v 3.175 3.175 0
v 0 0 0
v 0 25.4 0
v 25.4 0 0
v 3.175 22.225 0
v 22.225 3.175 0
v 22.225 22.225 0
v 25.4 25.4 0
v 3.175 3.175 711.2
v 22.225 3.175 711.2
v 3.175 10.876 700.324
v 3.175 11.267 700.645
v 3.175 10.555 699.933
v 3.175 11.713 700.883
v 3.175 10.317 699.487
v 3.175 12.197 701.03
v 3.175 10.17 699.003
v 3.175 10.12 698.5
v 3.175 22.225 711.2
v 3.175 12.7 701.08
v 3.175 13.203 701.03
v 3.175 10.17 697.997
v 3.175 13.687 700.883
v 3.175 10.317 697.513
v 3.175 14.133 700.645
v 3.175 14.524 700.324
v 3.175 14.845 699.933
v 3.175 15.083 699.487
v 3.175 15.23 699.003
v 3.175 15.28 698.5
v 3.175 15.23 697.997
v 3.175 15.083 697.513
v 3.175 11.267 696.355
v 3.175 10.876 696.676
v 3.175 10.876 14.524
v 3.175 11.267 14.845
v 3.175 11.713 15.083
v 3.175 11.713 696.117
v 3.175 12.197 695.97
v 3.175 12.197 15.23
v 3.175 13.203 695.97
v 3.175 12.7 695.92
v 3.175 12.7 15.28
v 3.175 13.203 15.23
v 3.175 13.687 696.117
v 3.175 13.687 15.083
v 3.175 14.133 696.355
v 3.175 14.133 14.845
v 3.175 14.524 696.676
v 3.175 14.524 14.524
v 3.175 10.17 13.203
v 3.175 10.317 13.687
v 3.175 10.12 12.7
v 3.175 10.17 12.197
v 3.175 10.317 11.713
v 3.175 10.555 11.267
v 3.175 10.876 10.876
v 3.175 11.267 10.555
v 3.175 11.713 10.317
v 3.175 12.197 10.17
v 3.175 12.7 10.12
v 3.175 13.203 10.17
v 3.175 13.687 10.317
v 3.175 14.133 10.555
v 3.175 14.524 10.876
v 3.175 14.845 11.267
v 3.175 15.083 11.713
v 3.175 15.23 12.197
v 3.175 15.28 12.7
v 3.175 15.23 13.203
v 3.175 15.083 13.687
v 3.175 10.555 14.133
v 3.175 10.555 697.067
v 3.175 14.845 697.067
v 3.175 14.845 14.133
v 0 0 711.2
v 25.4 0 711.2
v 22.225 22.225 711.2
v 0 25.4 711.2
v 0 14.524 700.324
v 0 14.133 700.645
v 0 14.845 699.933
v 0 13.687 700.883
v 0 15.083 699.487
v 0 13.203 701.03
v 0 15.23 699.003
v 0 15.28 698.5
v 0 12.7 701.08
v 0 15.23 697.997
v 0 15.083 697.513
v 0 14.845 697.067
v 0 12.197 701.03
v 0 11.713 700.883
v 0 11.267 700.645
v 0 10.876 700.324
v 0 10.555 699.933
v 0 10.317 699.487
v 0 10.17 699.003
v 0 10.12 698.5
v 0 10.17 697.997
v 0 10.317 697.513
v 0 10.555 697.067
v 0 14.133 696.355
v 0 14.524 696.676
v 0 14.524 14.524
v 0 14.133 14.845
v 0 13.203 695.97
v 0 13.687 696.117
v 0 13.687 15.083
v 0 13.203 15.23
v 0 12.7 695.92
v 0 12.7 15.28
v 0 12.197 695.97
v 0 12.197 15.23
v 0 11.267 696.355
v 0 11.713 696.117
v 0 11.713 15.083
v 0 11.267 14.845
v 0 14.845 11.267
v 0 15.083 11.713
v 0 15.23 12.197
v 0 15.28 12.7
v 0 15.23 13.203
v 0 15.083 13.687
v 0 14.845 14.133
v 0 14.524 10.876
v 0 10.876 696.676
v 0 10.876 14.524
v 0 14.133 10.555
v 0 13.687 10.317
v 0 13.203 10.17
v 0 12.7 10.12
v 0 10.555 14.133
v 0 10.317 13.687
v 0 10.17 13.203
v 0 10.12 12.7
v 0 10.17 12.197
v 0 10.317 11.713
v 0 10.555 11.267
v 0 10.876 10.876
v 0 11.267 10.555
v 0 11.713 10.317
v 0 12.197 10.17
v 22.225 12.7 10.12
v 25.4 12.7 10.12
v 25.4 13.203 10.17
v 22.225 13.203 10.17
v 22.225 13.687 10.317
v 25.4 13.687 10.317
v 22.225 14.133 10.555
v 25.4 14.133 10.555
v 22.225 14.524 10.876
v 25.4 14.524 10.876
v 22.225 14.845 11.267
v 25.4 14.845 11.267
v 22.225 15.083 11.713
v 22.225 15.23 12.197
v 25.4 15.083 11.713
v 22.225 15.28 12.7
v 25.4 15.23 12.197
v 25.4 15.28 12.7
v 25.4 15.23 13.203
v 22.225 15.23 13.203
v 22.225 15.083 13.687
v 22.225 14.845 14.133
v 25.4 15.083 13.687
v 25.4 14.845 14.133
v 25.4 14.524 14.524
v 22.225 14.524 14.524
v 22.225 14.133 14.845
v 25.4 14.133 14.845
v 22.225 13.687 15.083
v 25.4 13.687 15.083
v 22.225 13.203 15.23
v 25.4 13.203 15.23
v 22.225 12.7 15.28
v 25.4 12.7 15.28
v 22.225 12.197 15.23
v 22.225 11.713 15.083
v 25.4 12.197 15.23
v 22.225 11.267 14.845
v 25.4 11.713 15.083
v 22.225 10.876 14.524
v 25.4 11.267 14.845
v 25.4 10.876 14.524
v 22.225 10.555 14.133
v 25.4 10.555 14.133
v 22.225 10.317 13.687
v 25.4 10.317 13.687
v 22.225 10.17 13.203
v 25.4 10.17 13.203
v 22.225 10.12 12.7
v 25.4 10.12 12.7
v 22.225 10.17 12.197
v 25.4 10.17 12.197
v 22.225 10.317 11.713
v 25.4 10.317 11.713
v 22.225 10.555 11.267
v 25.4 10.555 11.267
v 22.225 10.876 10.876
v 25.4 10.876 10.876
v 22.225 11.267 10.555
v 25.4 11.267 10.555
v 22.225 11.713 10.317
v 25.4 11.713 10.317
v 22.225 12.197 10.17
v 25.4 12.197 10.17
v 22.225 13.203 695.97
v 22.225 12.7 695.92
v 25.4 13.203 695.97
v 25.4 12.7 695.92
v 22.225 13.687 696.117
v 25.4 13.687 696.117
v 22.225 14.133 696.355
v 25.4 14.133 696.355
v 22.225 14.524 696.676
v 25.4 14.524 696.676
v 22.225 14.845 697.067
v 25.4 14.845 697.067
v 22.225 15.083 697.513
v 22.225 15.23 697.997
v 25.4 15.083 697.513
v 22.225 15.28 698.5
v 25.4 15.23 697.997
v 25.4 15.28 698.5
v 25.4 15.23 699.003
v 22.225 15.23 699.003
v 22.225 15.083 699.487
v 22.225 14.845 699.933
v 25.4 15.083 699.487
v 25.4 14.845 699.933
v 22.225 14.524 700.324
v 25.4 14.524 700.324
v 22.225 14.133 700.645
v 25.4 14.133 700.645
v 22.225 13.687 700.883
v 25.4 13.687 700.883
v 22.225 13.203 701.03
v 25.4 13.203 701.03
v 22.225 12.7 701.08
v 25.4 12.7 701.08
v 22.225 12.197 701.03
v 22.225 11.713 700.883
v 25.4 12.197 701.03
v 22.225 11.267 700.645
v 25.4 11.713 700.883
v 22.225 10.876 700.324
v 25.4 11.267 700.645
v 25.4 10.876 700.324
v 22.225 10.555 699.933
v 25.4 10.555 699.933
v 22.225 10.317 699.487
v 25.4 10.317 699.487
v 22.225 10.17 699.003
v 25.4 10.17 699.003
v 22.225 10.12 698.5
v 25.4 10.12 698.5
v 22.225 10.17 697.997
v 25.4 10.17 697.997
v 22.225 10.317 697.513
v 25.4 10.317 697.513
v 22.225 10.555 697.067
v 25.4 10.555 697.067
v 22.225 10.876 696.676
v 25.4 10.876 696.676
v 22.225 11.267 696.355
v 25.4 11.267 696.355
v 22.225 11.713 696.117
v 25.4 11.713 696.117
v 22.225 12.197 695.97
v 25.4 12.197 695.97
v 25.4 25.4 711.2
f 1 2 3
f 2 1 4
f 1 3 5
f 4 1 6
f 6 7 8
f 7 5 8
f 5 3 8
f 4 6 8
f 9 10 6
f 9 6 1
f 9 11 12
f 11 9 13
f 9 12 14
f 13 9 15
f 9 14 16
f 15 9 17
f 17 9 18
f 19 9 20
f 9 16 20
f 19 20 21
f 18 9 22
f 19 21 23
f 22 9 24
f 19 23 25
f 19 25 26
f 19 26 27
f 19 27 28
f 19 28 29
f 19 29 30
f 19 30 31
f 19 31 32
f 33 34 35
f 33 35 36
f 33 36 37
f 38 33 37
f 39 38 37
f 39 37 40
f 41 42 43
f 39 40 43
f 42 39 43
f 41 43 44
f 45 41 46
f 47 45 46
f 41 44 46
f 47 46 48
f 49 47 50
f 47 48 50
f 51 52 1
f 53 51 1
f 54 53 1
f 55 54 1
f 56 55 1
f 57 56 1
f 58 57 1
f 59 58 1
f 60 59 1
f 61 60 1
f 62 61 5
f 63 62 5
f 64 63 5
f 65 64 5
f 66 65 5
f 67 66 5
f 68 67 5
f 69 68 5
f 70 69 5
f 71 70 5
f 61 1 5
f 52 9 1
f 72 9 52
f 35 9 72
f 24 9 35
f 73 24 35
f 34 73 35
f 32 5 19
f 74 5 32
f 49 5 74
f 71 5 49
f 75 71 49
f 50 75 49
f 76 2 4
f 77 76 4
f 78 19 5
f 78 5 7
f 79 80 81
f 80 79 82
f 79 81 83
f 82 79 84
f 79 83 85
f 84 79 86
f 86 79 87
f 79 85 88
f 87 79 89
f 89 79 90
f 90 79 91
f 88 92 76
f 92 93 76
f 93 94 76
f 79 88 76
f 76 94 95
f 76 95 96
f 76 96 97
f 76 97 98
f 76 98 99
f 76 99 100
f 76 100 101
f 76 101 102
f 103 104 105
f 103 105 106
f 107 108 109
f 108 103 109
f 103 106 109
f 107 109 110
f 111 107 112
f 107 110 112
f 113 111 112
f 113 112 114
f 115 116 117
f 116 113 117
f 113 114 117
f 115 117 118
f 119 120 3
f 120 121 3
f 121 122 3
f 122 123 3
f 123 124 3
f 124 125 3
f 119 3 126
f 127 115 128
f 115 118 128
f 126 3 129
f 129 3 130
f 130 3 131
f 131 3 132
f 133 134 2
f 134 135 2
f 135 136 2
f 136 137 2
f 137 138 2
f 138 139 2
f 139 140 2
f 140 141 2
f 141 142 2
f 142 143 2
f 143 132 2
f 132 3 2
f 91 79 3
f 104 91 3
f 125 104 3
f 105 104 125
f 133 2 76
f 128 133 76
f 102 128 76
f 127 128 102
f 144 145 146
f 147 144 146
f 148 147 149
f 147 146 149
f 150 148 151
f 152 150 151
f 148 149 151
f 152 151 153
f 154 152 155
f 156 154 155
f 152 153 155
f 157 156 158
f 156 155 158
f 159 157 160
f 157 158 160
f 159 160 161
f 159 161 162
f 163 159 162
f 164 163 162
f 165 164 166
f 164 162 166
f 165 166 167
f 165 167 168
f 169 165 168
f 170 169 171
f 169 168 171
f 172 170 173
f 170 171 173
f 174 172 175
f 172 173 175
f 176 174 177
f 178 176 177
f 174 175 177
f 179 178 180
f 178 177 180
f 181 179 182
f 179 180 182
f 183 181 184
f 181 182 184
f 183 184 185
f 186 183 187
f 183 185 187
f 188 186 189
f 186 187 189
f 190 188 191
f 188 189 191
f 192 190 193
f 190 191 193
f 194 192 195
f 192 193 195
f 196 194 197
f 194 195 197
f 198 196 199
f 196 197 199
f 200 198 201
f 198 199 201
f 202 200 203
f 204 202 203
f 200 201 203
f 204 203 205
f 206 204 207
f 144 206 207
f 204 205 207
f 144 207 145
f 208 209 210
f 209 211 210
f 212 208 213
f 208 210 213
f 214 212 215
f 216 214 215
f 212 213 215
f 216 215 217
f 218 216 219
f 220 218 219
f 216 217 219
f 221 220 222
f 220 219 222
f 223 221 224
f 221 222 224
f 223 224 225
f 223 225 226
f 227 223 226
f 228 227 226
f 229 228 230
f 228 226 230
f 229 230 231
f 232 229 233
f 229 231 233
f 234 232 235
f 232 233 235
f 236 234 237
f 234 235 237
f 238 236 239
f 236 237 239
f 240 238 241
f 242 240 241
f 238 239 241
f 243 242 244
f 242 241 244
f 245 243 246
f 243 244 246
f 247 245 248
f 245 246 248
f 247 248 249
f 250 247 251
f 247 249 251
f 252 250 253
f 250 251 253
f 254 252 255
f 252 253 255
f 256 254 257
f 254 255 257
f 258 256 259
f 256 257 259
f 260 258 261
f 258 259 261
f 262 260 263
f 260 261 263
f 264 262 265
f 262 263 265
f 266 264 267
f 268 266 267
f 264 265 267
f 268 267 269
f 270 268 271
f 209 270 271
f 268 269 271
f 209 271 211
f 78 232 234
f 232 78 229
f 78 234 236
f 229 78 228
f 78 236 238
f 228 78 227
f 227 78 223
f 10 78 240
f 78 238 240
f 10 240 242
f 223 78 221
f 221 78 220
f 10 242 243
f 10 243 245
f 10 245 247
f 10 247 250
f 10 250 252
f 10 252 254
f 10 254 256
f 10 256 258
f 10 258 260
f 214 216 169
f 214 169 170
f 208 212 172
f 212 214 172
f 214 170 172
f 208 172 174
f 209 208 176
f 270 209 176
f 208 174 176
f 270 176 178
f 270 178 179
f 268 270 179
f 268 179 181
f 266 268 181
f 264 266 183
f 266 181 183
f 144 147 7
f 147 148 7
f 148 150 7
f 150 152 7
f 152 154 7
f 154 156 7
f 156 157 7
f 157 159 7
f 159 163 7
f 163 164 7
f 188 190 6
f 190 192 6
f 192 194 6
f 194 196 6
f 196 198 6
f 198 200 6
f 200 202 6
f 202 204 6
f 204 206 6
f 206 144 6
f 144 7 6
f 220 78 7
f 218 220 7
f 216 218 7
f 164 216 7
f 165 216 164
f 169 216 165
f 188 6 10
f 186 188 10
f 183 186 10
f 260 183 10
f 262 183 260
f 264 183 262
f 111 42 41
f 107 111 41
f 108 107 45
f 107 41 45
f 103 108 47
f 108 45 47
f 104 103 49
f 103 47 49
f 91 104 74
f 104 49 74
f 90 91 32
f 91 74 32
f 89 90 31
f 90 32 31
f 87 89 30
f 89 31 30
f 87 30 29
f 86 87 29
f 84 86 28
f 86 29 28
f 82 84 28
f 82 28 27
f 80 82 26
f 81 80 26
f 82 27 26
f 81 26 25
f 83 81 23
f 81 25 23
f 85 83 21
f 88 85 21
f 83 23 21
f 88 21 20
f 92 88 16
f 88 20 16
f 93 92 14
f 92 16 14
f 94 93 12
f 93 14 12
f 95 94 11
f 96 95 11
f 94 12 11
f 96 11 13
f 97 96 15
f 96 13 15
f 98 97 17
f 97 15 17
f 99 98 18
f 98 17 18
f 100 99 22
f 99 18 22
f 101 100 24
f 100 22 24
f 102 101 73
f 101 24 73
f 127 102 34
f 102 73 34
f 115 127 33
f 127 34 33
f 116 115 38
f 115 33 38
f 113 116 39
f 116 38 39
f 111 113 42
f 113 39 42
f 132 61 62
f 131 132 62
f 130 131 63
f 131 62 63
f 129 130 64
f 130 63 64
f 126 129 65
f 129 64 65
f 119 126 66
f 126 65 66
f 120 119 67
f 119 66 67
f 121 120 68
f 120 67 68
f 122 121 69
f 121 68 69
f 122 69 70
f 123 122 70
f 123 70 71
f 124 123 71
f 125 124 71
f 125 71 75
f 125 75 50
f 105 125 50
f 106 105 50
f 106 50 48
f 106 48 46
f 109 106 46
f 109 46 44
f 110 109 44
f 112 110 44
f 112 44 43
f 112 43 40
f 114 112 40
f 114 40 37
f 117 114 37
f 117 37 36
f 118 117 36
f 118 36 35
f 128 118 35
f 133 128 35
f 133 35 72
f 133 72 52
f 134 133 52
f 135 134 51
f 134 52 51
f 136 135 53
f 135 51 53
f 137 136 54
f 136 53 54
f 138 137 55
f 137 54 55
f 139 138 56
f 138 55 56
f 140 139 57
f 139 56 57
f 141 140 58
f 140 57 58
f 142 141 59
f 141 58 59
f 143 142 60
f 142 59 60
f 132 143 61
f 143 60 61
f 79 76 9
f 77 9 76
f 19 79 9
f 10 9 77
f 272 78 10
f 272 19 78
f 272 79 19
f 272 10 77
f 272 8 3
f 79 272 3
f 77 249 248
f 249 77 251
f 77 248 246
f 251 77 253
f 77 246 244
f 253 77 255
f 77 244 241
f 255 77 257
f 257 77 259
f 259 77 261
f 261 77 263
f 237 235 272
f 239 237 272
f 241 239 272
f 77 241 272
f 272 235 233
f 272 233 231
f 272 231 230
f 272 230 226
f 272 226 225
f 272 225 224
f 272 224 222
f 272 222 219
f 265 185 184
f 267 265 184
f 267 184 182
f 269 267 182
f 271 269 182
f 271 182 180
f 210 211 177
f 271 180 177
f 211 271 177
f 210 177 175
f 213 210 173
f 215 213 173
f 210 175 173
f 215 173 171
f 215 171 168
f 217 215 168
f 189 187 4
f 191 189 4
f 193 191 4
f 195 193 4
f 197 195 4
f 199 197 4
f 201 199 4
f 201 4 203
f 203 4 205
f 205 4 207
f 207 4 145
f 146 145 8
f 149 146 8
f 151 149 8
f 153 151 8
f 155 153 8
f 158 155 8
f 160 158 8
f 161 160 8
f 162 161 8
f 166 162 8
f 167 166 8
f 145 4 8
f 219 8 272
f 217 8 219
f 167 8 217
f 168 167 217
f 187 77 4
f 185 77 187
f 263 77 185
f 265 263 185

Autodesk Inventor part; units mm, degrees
ref_plane "YZ Plane" through (0, 0, 0) normal (1, 0, 0) x (0, 1, 0)
ref_plane "XZ Plane" through (0, 0, 0) normal (0, 1, 0) x (-1, 0, 0)
ref_plane "XY Plane" through (0, 0, 0) normal (0, 0, 1) x (1, 0, 0)
sketch "Sketch1" plane through (0, 0, 0) normal (0, 0, 1) x (1, 0, 0)
  line L0 (0, 0) -> (25.4, 0)
  line L1 (25.4, 0) -> (25.4, 25.4)
  line L2 (25.4, 25.4) -> (0, 25.4)
  line L3 (0, 25.4) -> (0, 0)
  line L4 (3.175, 22.225) -> (22.225, 22.225)
  line L5 (22.225, 22.225) -> (22.225, 3.175)
  line L6 (22.225, 3.175) -> (3.175, 3.175)
  line L7 (3.175, 3.175) -> (3.175, 22.225)
  dimension "d0" = 25.4
  dimension "d1" = 25.4
  dimension "d2" = 3.175
extrude "Extrusion1" add sketch "Sketch1" along normal blind 711.2
sketch "Sketch2" plane through (25.4, 0, 0) normal (1, 0, 0) x (0, 0, -1)
  line L0 (0, 3.175) -> (0, 22.225) construction
  line L1 (0, 12.7) -> (-12.7, 12.7) construction
  line L2 (-711.2, 22.225) -> (-711.2, 3.175) construction
  line L3 (-711.2, 12.7) -> (-698.5, 12.7) construction
  circle A0 centre (-698.5, 12.7) radius 2.5797
  circle A1 centre (-12.7, 12.7) radius 2.5797
  point P0 (0, 0)
  dimension "d5" = 12.7
  dimension "d6" = 12.7
  dimension "d7" = 5.1594
extrude "Extrusion2" cut sketch "Sketch2" against normal blind 25.4
properties part number "1x1 28 in"
